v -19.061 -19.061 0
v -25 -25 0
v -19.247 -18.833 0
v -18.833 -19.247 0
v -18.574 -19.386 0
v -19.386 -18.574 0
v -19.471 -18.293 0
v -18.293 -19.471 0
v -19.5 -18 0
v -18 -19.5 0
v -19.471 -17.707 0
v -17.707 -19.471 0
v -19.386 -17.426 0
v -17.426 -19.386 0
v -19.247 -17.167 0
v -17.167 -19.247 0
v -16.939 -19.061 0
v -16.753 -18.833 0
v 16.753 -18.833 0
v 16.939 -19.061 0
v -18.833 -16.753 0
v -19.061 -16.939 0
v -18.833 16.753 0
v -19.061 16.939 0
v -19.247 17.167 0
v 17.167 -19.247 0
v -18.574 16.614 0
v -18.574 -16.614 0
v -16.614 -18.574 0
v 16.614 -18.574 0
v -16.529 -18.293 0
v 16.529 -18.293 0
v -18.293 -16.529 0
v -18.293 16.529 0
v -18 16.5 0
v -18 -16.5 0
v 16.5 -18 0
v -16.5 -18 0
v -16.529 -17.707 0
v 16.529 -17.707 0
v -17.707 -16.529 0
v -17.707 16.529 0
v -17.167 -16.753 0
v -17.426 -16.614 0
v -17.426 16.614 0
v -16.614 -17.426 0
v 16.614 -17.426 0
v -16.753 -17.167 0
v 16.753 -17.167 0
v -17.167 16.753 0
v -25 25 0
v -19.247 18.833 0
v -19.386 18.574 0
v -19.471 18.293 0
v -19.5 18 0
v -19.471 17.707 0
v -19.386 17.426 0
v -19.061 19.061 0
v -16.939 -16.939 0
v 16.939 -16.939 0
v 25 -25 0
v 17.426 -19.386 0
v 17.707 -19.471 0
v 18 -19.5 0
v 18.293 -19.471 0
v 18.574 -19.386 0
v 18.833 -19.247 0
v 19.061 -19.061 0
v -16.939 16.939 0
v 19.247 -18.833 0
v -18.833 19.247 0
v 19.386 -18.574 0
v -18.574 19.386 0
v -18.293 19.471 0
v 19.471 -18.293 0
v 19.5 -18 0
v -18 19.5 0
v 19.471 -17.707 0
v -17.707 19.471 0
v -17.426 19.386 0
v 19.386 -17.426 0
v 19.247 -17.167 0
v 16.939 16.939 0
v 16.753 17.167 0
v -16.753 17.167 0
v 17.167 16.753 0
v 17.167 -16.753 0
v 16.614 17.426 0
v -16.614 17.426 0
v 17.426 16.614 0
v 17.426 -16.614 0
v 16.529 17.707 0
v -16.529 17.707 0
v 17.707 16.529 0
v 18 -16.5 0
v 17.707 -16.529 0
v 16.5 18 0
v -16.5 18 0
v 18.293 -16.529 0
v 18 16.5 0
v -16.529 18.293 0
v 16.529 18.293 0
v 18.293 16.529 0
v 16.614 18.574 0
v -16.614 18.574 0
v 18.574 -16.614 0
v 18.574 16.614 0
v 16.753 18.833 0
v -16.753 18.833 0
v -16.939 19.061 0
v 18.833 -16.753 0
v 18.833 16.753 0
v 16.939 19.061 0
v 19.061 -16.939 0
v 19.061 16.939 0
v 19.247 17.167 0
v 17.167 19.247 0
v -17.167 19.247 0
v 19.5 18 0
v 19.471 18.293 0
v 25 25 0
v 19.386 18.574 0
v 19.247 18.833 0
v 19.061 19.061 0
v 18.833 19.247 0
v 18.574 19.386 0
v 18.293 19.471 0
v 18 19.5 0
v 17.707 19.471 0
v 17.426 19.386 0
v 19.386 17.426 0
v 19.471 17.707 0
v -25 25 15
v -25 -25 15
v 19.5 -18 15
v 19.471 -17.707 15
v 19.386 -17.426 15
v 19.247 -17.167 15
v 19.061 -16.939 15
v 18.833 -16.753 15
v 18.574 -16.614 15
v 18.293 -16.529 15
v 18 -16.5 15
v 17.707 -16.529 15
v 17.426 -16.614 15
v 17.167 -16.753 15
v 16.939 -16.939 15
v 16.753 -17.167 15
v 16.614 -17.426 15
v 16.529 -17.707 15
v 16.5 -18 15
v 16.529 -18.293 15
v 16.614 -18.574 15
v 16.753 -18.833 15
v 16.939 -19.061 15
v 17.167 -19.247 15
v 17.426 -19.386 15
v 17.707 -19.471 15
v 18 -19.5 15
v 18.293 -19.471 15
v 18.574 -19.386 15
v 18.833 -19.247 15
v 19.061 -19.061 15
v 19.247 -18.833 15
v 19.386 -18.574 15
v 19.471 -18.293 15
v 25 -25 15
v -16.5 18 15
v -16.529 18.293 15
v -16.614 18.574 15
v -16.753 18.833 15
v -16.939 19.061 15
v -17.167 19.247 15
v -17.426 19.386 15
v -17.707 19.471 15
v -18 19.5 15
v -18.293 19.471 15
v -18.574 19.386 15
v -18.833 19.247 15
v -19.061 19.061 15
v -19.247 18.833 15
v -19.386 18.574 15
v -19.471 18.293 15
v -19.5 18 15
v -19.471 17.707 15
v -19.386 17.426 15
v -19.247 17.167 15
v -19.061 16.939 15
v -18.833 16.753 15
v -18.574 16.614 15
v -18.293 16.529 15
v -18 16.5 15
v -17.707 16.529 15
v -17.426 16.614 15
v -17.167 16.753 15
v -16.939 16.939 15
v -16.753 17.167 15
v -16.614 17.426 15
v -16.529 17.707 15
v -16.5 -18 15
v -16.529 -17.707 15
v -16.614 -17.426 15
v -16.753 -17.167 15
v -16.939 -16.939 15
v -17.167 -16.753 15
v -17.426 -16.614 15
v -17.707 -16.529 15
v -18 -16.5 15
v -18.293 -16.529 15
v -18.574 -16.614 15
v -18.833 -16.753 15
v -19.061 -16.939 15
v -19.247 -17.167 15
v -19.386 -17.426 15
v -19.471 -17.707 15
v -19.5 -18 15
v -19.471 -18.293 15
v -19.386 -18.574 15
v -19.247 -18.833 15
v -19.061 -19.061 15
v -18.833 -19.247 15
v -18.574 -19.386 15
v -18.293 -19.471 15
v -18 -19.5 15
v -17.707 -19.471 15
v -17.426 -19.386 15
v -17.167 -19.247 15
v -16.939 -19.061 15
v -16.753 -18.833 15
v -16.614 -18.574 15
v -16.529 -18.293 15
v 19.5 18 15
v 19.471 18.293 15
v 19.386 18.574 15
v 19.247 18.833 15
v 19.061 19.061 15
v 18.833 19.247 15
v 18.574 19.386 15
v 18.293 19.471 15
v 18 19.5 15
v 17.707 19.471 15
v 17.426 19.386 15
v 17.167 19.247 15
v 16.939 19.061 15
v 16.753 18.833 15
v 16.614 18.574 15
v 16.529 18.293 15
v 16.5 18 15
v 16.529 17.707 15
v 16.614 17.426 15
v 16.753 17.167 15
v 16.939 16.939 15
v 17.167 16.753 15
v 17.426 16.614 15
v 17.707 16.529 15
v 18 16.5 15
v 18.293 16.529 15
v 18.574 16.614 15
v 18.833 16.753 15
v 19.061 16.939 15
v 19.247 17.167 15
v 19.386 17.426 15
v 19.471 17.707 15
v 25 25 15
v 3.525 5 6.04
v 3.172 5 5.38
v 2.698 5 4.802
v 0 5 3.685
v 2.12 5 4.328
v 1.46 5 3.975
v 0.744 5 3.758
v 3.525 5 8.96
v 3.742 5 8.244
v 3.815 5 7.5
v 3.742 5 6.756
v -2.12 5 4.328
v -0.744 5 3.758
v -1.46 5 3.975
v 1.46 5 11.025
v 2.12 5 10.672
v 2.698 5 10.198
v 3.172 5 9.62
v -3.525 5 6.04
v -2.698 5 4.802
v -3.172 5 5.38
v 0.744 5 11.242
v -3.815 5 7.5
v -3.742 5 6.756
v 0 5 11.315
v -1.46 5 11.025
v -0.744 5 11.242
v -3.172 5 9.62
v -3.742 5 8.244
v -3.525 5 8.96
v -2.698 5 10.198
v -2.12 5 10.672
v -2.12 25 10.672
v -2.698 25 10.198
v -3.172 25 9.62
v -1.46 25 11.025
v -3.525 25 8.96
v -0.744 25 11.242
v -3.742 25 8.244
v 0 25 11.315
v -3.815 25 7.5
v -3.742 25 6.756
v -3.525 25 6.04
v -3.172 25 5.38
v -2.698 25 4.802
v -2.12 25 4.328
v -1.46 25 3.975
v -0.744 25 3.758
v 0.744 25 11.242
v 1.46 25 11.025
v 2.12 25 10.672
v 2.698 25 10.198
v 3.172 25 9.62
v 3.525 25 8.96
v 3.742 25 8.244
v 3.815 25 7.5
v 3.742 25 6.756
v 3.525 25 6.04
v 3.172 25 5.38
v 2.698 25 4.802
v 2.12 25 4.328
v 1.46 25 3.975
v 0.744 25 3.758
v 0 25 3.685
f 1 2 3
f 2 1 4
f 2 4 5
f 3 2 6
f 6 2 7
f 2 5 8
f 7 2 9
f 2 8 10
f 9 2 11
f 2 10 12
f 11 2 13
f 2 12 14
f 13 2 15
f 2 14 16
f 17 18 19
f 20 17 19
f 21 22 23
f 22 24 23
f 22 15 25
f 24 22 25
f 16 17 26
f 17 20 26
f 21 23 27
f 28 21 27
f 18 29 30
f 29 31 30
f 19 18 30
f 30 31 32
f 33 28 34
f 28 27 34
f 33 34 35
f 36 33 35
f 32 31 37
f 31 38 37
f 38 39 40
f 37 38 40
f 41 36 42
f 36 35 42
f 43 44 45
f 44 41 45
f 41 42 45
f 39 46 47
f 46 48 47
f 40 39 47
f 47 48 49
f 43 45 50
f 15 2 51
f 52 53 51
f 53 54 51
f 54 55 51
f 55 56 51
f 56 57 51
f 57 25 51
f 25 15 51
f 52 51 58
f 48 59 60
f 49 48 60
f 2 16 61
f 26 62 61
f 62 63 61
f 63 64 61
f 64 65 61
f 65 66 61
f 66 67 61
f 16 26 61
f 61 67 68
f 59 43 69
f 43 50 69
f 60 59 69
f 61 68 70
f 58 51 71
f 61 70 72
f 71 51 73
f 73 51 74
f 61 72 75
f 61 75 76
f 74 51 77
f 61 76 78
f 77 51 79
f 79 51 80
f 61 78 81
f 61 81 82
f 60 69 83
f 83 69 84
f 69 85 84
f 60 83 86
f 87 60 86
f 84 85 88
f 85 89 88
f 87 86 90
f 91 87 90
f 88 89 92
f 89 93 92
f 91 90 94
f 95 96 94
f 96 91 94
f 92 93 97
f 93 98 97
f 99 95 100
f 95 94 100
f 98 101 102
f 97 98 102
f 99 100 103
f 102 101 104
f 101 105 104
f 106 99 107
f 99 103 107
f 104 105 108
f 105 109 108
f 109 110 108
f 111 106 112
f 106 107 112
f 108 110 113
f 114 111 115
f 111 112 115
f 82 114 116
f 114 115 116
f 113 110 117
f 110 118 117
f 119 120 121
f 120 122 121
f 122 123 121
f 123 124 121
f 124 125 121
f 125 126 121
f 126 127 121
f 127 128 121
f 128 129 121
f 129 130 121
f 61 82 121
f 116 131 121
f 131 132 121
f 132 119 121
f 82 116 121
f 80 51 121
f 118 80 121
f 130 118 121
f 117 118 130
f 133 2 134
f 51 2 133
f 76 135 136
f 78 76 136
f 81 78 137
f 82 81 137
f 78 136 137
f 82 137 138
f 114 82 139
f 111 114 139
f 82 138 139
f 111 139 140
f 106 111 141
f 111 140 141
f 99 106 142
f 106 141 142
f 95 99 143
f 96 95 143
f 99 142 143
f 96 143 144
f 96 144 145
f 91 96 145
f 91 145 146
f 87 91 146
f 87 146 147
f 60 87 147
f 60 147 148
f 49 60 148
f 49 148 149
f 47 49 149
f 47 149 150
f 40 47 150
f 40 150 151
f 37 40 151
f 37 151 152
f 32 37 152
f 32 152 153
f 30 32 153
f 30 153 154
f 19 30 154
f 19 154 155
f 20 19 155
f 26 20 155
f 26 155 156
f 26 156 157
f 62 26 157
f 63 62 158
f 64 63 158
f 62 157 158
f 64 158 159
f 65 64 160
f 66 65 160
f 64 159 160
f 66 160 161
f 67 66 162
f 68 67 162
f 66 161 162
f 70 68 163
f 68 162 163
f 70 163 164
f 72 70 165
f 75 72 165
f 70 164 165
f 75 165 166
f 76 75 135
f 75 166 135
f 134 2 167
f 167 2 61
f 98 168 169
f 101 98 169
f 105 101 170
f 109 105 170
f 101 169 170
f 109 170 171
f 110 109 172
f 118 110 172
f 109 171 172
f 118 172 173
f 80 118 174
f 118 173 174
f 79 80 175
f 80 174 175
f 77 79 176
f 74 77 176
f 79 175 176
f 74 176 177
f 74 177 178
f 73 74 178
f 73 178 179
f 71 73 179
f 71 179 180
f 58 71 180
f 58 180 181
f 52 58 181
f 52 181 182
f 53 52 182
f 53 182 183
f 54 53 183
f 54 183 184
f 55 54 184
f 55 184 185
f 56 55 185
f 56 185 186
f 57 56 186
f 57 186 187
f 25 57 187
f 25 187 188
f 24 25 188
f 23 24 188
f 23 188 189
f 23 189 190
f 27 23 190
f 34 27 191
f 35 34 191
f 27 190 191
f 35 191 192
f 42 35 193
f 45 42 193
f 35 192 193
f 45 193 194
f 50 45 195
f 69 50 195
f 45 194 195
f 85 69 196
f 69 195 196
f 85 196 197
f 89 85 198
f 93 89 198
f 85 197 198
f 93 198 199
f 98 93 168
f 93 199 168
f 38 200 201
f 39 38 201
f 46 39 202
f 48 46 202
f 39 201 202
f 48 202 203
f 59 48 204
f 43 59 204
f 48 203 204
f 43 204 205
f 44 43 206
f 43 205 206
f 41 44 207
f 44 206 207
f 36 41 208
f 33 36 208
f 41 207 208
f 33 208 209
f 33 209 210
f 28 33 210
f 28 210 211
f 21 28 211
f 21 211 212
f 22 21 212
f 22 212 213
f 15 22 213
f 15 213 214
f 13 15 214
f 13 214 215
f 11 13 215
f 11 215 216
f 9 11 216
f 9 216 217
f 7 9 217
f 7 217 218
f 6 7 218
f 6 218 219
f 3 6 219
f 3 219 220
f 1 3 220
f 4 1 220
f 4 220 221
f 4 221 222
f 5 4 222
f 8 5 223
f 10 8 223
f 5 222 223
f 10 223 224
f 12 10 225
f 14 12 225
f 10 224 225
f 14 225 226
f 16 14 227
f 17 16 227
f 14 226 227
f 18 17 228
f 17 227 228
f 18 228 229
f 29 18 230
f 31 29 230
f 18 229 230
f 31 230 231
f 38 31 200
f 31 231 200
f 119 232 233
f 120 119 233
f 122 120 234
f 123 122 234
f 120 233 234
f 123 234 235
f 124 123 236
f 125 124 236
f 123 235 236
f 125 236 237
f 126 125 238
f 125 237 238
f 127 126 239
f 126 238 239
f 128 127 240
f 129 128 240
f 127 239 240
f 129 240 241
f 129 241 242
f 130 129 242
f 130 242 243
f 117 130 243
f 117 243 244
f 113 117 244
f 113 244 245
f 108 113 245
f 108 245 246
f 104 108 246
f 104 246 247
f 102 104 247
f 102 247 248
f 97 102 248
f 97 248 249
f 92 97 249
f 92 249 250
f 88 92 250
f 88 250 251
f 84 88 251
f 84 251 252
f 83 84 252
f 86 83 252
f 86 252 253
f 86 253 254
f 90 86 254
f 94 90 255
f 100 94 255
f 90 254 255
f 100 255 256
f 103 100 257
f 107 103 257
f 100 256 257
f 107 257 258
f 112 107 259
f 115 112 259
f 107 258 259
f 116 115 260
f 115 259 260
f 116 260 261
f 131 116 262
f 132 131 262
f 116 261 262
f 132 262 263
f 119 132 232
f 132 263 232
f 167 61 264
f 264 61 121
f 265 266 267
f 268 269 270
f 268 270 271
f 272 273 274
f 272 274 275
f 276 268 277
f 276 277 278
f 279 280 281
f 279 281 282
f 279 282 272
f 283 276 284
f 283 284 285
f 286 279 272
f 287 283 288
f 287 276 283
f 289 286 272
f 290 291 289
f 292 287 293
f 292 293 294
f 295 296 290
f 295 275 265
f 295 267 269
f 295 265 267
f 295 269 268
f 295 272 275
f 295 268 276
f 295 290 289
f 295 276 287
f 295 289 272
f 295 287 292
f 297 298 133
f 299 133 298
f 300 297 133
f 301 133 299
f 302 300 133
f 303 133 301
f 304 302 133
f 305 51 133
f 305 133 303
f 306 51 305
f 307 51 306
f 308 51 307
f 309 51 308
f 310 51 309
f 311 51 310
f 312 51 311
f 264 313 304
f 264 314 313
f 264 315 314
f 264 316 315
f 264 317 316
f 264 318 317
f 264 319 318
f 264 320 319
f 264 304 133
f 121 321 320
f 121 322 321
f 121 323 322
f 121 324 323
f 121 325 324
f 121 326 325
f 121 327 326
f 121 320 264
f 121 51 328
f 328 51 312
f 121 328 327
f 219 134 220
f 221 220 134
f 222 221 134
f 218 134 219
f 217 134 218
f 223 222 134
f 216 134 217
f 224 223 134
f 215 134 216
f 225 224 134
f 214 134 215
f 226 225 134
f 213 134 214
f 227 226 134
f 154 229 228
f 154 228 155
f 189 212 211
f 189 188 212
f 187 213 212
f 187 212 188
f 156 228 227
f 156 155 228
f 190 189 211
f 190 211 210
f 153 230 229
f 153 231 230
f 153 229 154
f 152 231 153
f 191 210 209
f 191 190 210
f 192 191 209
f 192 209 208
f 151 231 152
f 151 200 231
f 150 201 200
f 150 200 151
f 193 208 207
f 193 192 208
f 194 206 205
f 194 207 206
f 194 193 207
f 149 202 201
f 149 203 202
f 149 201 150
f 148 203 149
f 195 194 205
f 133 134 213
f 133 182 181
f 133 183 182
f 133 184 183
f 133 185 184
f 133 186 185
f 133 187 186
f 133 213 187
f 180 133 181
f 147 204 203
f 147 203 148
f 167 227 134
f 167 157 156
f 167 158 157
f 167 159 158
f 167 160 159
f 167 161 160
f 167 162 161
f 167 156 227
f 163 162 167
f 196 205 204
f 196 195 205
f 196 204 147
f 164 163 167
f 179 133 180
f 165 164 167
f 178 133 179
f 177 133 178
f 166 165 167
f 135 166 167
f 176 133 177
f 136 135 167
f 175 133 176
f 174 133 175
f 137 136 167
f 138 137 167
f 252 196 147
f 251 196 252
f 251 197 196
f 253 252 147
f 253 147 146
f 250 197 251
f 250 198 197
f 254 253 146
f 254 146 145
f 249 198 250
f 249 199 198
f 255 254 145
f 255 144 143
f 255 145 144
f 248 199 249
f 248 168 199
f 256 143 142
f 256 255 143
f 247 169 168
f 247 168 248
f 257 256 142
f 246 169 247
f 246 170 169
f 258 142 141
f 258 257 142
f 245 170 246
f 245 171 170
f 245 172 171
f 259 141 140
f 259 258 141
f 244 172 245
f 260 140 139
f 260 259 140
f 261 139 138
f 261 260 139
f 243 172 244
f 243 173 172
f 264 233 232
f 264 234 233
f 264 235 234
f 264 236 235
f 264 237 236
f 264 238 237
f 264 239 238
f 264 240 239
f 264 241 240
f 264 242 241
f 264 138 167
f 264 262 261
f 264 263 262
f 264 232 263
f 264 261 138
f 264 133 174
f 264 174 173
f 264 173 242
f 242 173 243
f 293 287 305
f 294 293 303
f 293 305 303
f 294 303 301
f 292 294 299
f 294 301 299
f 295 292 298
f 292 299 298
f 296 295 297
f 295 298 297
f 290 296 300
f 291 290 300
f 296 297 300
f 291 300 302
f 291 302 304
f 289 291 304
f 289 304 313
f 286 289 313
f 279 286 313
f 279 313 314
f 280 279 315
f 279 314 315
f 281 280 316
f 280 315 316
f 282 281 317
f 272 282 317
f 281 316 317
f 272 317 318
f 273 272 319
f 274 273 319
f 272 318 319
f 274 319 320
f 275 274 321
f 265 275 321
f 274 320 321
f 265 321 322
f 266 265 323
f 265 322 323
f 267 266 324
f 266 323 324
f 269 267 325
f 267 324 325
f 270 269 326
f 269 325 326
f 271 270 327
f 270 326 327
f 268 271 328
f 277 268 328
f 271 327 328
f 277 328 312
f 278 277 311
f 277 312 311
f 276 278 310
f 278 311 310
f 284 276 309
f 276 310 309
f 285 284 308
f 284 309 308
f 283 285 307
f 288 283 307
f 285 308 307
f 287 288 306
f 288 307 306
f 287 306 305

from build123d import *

# Parameters (mm, degrees)
ESBO_O1_W                = 50
ESBO_O1_H                = 50
RESSALTO_EXTRUS_O1_DEPTH = 15
ESBO_O2_R                = 3.815
CORTE_EXTRUS_O1_DEPTH    = 20
ESBO_O3_R                = 1.5
CORTE_EXTRUS_O2_DEPTH    = 39.405728739


with BuildPart() as part:
    # Esboço1 → Ressalto-extrusão1 (new body)
    with BuildSketch(Plane.XY):
        Rectangle(ESBO_O1_W, ESBO_O1_H)
    extrude(amount=RESSALTO_EXTRUS_O1_DEPTH)

    # Esboço2 → Corte-extrusão1 (cut)
    with BuildSketch(Plane(origin=(0, 25, 0), x_dir=(1, 0, 0), z_dir=(0, 1, 0))):
        with Locations(Location((0, -7.5, 0), (0, 0, 180))):
            Circle(ESBO_O2_R)
    extrude(amount=-CORTE_EXTRUS_O1_DEPTH, mode=Mode.SUBTRACT)

    # Esboço3 → Corte-extrusão2 (cut, through all)
    with BuildSketch(Plane.XY.offset(15)):
        with Locations((-18, 18)):
            Circle(ESBO_O3_R)
        with Locations((-18, -18)):
            Circle(ESBO_O3_R)
        with Locations((18, 18)):
            Circle(ESBO_O3_R)
        with Locations((18, -18)):
            Circle(ESBO_O3_R)
    extrude(amount=-CORTE_EXTRUS_O2_DEPTH, mode=Mode.SUBTRACT)


solid = part.part
